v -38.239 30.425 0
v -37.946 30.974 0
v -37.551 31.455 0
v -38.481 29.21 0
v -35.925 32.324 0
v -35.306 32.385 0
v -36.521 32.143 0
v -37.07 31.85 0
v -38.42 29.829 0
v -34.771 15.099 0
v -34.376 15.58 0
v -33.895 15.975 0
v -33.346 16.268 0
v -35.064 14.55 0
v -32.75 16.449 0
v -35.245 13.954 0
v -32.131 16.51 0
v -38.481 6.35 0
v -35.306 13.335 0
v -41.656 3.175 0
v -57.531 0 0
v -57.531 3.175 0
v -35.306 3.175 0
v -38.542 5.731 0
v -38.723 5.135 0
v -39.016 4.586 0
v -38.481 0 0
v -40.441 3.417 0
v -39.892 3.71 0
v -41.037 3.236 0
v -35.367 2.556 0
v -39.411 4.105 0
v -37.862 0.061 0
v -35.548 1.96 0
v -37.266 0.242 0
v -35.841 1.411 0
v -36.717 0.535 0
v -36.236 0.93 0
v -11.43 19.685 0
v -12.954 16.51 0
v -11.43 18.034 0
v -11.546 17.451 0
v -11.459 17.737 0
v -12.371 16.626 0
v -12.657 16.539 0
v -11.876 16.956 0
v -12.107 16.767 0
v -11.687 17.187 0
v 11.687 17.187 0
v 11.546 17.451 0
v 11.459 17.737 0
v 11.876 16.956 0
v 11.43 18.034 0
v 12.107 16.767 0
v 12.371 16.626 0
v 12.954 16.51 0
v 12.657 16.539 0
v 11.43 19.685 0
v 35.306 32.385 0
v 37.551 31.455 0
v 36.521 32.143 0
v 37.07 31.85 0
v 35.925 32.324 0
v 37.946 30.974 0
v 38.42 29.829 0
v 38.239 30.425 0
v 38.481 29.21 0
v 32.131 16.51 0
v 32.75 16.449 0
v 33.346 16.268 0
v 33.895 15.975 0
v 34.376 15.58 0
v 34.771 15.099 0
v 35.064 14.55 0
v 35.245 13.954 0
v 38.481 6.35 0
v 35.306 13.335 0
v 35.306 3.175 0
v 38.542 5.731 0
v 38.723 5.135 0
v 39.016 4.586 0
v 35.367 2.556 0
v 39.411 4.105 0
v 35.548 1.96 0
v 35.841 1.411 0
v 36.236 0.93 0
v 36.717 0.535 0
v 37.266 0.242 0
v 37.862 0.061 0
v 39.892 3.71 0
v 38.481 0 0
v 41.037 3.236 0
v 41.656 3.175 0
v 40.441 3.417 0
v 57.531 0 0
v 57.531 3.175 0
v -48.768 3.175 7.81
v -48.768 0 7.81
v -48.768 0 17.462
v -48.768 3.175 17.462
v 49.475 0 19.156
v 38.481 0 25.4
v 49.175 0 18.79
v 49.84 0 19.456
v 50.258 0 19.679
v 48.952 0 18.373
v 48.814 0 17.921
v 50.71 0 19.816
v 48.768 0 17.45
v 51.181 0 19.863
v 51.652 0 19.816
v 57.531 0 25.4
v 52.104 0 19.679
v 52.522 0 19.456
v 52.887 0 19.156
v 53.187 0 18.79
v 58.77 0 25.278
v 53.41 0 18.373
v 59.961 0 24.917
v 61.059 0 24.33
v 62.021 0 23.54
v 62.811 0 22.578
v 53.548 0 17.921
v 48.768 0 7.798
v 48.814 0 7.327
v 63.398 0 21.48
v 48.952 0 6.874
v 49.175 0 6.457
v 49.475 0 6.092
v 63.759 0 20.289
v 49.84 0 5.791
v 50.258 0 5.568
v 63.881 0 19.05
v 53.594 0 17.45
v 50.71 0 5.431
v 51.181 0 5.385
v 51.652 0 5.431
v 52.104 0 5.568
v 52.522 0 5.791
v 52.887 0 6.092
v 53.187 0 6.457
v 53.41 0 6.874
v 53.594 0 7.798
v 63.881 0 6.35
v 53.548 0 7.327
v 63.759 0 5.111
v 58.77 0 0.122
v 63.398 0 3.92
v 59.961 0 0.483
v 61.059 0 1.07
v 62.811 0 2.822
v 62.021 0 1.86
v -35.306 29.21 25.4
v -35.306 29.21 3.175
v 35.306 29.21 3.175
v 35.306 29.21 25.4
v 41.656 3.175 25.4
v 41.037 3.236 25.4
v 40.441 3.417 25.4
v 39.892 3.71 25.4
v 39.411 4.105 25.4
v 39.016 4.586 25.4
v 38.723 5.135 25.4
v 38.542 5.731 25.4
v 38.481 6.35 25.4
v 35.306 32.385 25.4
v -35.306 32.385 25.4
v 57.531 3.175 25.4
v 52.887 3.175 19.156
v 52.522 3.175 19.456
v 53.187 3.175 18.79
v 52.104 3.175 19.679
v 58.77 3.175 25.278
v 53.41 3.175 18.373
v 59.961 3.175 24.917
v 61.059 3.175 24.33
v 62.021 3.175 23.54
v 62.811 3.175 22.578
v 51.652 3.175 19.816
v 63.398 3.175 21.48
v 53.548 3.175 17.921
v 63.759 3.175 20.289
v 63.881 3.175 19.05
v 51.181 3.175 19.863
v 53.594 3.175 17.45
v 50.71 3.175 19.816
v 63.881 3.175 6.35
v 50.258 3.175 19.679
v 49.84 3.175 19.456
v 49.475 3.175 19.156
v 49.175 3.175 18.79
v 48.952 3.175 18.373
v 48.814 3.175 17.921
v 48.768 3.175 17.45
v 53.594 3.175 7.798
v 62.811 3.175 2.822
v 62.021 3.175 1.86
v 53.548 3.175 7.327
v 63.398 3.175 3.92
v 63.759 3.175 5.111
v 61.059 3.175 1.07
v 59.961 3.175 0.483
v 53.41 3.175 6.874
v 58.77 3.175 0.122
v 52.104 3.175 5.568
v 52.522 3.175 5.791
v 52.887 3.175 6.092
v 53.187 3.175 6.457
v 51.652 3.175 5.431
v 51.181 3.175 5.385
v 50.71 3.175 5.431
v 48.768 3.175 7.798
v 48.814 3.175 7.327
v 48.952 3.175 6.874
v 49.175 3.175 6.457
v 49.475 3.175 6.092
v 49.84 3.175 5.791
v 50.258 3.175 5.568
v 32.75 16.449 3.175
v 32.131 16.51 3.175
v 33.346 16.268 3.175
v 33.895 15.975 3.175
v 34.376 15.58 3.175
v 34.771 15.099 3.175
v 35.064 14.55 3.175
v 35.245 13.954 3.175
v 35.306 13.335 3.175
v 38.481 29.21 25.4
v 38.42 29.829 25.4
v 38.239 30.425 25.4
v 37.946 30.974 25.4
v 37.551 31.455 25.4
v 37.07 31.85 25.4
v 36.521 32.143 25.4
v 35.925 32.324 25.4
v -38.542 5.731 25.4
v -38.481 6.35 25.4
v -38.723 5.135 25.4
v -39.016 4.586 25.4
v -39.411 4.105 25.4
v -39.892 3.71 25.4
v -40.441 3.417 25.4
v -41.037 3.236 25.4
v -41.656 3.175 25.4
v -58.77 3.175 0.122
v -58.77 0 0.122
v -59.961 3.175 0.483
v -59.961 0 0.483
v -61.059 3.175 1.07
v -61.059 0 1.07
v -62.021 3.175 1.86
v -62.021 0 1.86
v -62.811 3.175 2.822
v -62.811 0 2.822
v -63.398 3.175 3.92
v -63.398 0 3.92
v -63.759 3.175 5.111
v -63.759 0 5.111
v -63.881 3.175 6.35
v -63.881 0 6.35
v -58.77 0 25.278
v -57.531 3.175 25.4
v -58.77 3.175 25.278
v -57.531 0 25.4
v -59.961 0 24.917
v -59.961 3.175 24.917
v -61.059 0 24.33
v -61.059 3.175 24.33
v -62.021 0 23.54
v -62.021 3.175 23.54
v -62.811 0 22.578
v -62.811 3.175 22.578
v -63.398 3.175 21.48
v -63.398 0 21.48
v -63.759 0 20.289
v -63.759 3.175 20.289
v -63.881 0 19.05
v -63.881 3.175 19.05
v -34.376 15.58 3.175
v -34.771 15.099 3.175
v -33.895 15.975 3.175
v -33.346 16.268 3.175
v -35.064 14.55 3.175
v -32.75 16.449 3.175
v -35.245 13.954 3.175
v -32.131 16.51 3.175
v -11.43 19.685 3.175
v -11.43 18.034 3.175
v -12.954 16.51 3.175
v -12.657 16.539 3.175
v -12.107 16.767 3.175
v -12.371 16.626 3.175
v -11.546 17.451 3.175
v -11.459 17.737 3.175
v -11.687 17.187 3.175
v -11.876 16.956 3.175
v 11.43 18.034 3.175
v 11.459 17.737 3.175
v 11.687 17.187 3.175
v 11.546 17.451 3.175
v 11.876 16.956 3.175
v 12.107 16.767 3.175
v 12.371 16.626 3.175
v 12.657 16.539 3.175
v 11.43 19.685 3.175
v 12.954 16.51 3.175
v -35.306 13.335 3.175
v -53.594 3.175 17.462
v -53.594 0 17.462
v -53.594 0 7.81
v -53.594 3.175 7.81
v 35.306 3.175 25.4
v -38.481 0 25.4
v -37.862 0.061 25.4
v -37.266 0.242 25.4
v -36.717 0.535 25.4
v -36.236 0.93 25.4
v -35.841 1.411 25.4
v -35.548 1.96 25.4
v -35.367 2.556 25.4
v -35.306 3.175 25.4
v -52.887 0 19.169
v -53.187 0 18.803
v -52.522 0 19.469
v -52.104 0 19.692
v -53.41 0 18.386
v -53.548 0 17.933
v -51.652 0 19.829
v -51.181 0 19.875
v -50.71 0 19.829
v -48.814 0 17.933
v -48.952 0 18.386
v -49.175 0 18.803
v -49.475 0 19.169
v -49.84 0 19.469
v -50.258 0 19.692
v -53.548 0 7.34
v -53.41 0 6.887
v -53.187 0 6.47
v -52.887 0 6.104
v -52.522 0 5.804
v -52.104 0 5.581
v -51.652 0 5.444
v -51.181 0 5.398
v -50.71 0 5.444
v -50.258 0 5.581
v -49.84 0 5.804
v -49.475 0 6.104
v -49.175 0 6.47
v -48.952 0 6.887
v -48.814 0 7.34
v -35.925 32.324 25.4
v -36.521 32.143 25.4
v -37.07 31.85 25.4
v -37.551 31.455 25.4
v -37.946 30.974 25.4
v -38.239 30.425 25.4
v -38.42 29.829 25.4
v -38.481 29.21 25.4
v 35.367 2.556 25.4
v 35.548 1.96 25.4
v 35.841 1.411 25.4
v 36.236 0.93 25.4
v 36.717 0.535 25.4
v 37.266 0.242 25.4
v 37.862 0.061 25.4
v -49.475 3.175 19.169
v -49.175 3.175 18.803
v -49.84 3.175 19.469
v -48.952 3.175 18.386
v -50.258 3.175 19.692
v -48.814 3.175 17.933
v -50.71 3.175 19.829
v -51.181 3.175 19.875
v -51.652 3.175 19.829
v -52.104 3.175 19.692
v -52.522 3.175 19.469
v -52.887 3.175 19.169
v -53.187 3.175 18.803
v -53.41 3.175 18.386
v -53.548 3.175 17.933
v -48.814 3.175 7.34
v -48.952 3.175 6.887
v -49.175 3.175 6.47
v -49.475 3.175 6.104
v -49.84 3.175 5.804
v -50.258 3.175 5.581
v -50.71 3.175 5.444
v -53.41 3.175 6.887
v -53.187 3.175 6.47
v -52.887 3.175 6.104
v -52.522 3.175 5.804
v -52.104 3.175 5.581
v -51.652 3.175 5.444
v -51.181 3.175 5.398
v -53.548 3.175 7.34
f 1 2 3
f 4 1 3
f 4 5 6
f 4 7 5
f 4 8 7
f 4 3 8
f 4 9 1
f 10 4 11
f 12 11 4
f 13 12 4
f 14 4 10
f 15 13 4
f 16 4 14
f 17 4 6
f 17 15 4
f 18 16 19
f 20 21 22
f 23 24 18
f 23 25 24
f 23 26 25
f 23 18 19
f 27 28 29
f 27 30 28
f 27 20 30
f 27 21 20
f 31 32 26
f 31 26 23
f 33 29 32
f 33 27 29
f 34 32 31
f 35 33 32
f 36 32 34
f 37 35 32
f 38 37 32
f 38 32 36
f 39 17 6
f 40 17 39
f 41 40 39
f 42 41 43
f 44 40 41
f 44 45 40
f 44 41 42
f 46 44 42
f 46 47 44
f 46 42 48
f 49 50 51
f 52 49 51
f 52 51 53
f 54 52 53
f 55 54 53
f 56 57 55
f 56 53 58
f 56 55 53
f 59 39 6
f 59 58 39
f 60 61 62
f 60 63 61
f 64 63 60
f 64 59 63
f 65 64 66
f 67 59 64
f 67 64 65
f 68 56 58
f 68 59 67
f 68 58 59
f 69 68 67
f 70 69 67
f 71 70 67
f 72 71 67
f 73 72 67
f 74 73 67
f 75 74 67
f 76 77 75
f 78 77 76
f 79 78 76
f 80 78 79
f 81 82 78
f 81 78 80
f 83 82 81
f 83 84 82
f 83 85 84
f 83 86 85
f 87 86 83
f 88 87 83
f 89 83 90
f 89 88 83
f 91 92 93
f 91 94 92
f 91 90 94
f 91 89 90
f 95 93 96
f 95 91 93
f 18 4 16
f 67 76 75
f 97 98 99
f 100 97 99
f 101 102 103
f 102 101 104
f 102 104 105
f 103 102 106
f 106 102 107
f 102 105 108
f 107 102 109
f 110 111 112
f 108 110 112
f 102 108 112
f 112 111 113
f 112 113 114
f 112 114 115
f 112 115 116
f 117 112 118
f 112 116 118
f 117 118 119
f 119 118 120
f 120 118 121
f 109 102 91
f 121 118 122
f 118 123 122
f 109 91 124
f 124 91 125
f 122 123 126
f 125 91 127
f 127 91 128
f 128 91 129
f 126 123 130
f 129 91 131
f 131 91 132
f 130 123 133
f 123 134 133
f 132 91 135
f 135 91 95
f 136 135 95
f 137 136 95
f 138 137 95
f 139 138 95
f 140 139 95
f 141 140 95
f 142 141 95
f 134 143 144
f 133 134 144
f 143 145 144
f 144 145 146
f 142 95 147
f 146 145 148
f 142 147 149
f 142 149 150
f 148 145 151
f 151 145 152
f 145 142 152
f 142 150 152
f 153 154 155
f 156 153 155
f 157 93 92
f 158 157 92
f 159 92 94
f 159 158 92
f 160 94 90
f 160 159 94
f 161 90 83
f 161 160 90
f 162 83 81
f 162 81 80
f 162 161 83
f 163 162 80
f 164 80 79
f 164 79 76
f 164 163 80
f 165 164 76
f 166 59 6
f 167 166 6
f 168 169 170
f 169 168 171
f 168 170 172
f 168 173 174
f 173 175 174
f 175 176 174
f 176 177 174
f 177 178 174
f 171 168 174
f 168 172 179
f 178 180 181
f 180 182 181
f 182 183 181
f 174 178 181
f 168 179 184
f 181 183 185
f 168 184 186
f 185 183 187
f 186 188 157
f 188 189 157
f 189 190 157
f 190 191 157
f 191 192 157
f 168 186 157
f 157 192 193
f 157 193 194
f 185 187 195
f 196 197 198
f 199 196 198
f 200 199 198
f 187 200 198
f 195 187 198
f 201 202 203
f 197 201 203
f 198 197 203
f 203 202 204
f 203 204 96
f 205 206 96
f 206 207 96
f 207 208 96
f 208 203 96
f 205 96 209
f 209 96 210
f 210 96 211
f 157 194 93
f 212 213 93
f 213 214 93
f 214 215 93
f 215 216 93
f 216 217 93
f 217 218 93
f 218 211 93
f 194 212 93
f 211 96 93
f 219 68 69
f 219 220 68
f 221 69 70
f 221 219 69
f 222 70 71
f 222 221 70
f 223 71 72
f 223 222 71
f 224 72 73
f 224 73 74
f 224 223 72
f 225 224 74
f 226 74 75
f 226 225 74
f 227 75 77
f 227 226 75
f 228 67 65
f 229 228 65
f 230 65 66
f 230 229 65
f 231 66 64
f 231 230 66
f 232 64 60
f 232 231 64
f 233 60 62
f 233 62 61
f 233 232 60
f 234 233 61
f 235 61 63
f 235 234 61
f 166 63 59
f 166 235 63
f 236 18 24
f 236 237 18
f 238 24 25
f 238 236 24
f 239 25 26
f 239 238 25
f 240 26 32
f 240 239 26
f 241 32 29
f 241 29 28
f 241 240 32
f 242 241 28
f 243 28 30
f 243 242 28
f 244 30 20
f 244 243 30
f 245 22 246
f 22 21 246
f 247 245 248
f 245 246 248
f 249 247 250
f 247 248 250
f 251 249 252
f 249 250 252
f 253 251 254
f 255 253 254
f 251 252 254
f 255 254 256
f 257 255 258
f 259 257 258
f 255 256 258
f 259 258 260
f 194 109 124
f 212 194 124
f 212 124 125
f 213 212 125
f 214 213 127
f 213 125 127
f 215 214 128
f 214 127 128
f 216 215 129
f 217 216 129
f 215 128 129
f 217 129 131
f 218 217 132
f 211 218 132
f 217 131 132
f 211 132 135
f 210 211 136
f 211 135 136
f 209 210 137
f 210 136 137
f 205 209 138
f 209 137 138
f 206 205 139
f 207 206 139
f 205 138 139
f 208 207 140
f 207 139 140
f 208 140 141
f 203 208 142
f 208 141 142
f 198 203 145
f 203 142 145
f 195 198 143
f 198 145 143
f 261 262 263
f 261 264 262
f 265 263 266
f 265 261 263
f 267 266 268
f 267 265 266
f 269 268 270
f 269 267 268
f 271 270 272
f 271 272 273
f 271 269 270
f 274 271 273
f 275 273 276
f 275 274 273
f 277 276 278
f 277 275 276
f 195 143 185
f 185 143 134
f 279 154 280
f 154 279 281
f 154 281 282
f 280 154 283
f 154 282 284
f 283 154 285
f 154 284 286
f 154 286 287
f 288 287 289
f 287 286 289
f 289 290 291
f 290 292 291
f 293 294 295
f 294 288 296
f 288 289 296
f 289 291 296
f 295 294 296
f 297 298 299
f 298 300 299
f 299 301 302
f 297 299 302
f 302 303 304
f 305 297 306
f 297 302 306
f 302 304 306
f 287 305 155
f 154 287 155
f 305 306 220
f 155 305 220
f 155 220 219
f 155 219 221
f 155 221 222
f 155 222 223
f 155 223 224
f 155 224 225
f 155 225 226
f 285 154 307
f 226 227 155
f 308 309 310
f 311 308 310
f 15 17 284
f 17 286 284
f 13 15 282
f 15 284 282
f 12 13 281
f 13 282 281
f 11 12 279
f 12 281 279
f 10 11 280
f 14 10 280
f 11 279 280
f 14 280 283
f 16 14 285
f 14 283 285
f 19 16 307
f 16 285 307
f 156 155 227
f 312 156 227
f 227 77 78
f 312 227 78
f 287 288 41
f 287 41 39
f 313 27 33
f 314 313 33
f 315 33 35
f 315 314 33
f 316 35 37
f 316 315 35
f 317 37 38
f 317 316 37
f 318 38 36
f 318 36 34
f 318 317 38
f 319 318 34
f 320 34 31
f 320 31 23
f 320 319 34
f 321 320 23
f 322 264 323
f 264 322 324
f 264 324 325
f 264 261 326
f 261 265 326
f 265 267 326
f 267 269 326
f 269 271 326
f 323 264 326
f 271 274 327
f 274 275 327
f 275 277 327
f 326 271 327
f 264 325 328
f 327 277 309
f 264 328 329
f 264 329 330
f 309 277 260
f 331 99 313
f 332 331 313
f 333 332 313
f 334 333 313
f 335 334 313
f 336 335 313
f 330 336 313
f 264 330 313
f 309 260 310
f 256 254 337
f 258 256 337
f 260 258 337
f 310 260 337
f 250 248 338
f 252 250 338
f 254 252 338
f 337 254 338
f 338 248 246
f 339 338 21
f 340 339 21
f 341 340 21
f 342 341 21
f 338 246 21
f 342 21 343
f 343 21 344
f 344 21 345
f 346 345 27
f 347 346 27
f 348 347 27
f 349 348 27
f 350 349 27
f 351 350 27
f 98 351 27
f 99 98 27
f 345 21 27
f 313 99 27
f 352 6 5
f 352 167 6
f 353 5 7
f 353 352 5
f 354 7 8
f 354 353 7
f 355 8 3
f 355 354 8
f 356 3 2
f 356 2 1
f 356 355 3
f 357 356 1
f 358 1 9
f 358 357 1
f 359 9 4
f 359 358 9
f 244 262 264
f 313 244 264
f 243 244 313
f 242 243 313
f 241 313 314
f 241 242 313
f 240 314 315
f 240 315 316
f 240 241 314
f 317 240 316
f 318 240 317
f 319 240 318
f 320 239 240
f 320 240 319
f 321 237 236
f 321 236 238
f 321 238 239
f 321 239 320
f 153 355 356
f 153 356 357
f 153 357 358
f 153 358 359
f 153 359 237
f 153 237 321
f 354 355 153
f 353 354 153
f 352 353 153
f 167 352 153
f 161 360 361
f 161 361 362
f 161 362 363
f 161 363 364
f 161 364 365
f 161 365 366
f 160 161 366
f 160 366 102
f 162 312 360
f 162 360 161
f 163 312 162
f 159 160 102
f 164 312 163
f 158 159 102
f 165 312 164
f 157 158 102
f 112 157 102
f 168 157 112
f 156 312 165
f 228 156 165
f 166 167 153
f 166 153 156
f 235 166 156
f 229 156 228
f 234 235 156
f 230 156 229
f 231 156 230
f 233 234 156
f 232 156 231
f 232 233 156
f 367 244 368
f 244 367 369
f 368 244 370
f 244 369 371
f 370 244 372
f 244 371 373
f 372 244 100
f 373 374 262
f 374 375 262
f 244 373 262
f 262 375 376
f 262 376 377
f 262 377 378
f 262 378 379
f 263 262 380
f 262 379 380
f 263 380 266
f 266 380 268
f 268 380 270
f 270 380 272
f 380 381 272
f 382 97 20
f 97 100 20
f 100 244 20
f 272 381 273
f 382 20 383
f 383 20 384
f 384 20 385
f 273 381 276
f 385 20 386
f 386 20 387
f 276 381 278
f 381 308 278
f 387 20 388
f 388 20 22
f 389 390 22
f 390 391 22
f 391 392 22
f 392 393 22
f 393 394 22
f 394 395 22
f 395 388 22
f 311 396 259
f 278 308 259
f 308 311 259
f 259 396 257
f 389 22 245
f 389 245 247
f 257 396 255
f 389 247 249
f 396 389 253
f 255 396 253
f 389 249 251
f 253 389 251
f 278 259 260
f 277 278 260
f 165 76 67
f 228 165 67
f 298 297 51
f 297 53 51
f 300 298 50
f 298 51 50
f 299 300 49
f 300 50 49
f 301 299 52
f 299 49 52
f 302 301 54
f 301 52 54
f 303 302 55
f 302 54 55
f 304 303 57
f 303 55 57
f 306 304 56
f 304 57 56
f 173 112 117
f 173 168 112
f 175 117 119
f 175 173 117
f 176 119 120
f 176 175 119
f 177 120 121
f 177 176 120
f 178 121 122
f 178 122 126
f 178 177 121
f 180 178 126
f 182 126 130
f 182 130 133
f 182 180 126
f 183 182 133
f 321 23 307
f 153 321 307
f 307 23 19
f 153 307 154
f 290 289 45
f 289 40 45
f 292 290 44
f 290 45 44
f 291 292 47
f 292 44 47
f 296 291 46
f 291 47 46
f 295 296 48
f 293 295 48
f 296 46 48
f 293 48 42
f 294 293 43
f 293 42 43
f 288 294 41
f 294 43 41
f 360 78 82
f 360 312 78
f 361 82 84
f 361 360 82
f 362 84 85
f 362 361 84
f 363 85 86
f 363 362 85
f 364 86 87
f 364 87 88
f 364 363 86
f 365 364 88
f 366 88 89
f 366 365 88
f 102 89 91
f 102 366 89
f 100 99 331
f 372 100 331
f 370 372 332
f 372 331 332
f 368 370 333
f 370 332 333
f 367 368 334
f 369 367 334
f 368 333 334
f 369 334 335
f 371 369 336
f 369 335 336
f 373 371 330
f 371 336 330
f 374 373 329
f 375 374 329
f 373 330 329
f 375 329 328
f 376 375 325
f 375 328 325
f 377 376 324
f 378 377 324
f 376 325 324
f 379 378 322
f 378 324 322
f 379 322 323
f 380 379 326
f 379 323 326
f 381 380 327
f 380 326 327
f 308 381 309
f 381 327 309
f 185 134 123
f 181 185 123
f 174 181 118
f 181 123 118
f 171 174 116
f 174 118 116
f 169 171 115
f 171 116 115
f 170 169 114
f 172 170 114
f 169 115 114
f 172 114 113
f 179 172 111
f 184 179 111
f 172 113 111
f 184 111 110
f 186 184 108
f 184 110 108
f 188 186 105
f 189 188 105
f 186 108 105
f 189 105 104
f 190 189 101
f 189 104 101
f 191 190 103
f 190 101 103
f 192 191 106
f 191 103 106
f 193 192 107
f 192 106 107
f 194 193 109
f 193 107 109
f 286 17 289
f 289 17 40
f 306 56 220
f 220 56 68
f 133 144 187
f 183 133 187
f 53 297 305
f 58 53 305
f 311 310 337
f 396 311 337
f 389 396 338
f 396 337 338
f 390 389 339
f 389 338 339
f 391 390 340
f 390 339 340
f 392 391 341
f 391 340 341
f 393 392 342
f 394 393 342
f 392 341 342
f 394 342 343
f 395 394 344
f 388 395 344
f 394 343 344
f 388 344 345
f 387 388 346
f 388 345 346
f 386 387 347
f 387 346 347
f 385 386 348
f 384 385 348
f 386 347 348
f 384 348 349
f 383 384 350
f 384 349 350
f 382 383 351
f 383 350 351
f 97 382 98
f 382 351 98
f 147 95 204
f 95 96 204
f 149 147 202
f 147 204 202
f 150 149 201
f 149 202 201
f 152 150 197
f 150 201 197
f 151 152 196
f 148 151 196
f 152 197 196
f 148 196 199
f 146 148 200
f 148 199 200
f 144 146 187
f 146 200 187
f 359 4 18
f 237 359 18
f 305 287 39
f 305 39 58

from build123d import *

# Parameters (mm, degrees)
F1_DEPTH  = 25.4
F2_R      = 3.175
F4_DEPTH  = 32.386
F5_R      = 6.35
F6_W      = 70.612
F6_H      = 12.7
F7_DEPTH  = 3.175
F8_R      = 3.175
F9_W      = 22.86
F9_H      = 3.175
F10_DEPTH = 25.4
F11_R     = 1.524


with BuildPart() as f1:
    # F0 (on Top) → F1 (new body)
    with BuildSketch(Plane.XY):
        Polygon((-35.306, 29.21), (0, 29.21), (35.306, 29.21), (35.306, 0), (63.881, 0), (63.881, 3.175), (38.481, 3.175), (38.481, 32.385), (0, 32.385), (-38.481, 32.385), (-38.481, 3.175), (-63.881, 3.175), (-63.881, 0), (-35.306, 0), align=None)
    extrude(amount=F1_DEPTH)

    # F2
    f2_edges = [f1.edges().sort_by_distance(p)[0] for p in [
        (-35.306, 0, 12.7),
        (35.306, 0, 12.7),
    ]]
    fillet(f2_edges, radius=F2_R)

    # F3 (on Front) → F4 (cut, through all)
    with BuildSketch(Plane.XZ):
        with BuildLine():
            ThreePointArc((-53.594, 7.8105), (-51.181, 5.3975), (-48.768, 7.8105))
            Line((-48.768, 7.8105), (-48.768, 17.4625))
            ThreePointArc((-48.768, 17.4625), (-51.181, 19.8755), (-53.594, 17.4625))
            Line((-53.594, 17.4625), (-53.594, 7.8105))
        make_face()
        with BuildLine():
            ThreePointArc((53.594, 17.4498), (51.181, 19.8628), (48.768, 17.4498))
            Line((48.768, 17.4498), (48.768, 7.7978))
            ThreePointArc((48.768, 7.7978), (51.181, 5.3848), (53.594, 7.7978))
            Line((53.594, 7.7978), (53.594, 17.4498))
        make_face()
    extrude(amount=-F4_DEPTH, mode=Mode.SUBTRACT)

    # F5
    f5_edges = [f1.edges().sort_by_distance(p)[0] for p in [
        (-63.881, 1.5875, 0),
        (-63.881, 1.5875, 25.4),
        (63.881, 1.5875, 25.4),
        (63.881, 1.5875, 0),
    ]]
    fillet(f5_edges, radius=F5_R)

    # F6 (on face) → F7 (join)
    with BuildSketch(Plane(origin=(0, 0, 0), x_dir=(1, 0, 0), z_dir=(0, 0, -1))):
        with Locations((0, -22.86)):
            Rectangle(F6_W, F6_H)
    extrude(amount=-F7_DEPTH)

    # F8
    f8_edges = [f1.edges().sort_by_distance(p)[0] for p in [
        (38.481, 3.175, 12.7),
        (38.481, 32.385, 12.7),
        (-38.481, 32.385, 12.7),
        (-38.481, 3.175, 12.7),
        (35.306, 16.51, 1.5875),
        (-35.306, 16.51, 1.5875),
    ]]
    fillet(f8_edges, radius=F8_R)

    # F9 (on face) → F10 (cut)
    with BuildSketch(Plane.XY.offset(3.175)):
        with Locations((0, 18.0975)):
            Rectangle(F9_W, F9_H)
    extrude(amount=-F10_DEPTH, mode=Mode.SUBTRACT)

    # F11
    f11_edges = [f1.edges().sort_by_distance(p)[0] for p in [
        (-11.43, 16.51, 1.5875),
        (11.43, 16.51, 1.5875),
    ]]
    fillet(f11_edges, radius=F11_R)


solid = f1.part
